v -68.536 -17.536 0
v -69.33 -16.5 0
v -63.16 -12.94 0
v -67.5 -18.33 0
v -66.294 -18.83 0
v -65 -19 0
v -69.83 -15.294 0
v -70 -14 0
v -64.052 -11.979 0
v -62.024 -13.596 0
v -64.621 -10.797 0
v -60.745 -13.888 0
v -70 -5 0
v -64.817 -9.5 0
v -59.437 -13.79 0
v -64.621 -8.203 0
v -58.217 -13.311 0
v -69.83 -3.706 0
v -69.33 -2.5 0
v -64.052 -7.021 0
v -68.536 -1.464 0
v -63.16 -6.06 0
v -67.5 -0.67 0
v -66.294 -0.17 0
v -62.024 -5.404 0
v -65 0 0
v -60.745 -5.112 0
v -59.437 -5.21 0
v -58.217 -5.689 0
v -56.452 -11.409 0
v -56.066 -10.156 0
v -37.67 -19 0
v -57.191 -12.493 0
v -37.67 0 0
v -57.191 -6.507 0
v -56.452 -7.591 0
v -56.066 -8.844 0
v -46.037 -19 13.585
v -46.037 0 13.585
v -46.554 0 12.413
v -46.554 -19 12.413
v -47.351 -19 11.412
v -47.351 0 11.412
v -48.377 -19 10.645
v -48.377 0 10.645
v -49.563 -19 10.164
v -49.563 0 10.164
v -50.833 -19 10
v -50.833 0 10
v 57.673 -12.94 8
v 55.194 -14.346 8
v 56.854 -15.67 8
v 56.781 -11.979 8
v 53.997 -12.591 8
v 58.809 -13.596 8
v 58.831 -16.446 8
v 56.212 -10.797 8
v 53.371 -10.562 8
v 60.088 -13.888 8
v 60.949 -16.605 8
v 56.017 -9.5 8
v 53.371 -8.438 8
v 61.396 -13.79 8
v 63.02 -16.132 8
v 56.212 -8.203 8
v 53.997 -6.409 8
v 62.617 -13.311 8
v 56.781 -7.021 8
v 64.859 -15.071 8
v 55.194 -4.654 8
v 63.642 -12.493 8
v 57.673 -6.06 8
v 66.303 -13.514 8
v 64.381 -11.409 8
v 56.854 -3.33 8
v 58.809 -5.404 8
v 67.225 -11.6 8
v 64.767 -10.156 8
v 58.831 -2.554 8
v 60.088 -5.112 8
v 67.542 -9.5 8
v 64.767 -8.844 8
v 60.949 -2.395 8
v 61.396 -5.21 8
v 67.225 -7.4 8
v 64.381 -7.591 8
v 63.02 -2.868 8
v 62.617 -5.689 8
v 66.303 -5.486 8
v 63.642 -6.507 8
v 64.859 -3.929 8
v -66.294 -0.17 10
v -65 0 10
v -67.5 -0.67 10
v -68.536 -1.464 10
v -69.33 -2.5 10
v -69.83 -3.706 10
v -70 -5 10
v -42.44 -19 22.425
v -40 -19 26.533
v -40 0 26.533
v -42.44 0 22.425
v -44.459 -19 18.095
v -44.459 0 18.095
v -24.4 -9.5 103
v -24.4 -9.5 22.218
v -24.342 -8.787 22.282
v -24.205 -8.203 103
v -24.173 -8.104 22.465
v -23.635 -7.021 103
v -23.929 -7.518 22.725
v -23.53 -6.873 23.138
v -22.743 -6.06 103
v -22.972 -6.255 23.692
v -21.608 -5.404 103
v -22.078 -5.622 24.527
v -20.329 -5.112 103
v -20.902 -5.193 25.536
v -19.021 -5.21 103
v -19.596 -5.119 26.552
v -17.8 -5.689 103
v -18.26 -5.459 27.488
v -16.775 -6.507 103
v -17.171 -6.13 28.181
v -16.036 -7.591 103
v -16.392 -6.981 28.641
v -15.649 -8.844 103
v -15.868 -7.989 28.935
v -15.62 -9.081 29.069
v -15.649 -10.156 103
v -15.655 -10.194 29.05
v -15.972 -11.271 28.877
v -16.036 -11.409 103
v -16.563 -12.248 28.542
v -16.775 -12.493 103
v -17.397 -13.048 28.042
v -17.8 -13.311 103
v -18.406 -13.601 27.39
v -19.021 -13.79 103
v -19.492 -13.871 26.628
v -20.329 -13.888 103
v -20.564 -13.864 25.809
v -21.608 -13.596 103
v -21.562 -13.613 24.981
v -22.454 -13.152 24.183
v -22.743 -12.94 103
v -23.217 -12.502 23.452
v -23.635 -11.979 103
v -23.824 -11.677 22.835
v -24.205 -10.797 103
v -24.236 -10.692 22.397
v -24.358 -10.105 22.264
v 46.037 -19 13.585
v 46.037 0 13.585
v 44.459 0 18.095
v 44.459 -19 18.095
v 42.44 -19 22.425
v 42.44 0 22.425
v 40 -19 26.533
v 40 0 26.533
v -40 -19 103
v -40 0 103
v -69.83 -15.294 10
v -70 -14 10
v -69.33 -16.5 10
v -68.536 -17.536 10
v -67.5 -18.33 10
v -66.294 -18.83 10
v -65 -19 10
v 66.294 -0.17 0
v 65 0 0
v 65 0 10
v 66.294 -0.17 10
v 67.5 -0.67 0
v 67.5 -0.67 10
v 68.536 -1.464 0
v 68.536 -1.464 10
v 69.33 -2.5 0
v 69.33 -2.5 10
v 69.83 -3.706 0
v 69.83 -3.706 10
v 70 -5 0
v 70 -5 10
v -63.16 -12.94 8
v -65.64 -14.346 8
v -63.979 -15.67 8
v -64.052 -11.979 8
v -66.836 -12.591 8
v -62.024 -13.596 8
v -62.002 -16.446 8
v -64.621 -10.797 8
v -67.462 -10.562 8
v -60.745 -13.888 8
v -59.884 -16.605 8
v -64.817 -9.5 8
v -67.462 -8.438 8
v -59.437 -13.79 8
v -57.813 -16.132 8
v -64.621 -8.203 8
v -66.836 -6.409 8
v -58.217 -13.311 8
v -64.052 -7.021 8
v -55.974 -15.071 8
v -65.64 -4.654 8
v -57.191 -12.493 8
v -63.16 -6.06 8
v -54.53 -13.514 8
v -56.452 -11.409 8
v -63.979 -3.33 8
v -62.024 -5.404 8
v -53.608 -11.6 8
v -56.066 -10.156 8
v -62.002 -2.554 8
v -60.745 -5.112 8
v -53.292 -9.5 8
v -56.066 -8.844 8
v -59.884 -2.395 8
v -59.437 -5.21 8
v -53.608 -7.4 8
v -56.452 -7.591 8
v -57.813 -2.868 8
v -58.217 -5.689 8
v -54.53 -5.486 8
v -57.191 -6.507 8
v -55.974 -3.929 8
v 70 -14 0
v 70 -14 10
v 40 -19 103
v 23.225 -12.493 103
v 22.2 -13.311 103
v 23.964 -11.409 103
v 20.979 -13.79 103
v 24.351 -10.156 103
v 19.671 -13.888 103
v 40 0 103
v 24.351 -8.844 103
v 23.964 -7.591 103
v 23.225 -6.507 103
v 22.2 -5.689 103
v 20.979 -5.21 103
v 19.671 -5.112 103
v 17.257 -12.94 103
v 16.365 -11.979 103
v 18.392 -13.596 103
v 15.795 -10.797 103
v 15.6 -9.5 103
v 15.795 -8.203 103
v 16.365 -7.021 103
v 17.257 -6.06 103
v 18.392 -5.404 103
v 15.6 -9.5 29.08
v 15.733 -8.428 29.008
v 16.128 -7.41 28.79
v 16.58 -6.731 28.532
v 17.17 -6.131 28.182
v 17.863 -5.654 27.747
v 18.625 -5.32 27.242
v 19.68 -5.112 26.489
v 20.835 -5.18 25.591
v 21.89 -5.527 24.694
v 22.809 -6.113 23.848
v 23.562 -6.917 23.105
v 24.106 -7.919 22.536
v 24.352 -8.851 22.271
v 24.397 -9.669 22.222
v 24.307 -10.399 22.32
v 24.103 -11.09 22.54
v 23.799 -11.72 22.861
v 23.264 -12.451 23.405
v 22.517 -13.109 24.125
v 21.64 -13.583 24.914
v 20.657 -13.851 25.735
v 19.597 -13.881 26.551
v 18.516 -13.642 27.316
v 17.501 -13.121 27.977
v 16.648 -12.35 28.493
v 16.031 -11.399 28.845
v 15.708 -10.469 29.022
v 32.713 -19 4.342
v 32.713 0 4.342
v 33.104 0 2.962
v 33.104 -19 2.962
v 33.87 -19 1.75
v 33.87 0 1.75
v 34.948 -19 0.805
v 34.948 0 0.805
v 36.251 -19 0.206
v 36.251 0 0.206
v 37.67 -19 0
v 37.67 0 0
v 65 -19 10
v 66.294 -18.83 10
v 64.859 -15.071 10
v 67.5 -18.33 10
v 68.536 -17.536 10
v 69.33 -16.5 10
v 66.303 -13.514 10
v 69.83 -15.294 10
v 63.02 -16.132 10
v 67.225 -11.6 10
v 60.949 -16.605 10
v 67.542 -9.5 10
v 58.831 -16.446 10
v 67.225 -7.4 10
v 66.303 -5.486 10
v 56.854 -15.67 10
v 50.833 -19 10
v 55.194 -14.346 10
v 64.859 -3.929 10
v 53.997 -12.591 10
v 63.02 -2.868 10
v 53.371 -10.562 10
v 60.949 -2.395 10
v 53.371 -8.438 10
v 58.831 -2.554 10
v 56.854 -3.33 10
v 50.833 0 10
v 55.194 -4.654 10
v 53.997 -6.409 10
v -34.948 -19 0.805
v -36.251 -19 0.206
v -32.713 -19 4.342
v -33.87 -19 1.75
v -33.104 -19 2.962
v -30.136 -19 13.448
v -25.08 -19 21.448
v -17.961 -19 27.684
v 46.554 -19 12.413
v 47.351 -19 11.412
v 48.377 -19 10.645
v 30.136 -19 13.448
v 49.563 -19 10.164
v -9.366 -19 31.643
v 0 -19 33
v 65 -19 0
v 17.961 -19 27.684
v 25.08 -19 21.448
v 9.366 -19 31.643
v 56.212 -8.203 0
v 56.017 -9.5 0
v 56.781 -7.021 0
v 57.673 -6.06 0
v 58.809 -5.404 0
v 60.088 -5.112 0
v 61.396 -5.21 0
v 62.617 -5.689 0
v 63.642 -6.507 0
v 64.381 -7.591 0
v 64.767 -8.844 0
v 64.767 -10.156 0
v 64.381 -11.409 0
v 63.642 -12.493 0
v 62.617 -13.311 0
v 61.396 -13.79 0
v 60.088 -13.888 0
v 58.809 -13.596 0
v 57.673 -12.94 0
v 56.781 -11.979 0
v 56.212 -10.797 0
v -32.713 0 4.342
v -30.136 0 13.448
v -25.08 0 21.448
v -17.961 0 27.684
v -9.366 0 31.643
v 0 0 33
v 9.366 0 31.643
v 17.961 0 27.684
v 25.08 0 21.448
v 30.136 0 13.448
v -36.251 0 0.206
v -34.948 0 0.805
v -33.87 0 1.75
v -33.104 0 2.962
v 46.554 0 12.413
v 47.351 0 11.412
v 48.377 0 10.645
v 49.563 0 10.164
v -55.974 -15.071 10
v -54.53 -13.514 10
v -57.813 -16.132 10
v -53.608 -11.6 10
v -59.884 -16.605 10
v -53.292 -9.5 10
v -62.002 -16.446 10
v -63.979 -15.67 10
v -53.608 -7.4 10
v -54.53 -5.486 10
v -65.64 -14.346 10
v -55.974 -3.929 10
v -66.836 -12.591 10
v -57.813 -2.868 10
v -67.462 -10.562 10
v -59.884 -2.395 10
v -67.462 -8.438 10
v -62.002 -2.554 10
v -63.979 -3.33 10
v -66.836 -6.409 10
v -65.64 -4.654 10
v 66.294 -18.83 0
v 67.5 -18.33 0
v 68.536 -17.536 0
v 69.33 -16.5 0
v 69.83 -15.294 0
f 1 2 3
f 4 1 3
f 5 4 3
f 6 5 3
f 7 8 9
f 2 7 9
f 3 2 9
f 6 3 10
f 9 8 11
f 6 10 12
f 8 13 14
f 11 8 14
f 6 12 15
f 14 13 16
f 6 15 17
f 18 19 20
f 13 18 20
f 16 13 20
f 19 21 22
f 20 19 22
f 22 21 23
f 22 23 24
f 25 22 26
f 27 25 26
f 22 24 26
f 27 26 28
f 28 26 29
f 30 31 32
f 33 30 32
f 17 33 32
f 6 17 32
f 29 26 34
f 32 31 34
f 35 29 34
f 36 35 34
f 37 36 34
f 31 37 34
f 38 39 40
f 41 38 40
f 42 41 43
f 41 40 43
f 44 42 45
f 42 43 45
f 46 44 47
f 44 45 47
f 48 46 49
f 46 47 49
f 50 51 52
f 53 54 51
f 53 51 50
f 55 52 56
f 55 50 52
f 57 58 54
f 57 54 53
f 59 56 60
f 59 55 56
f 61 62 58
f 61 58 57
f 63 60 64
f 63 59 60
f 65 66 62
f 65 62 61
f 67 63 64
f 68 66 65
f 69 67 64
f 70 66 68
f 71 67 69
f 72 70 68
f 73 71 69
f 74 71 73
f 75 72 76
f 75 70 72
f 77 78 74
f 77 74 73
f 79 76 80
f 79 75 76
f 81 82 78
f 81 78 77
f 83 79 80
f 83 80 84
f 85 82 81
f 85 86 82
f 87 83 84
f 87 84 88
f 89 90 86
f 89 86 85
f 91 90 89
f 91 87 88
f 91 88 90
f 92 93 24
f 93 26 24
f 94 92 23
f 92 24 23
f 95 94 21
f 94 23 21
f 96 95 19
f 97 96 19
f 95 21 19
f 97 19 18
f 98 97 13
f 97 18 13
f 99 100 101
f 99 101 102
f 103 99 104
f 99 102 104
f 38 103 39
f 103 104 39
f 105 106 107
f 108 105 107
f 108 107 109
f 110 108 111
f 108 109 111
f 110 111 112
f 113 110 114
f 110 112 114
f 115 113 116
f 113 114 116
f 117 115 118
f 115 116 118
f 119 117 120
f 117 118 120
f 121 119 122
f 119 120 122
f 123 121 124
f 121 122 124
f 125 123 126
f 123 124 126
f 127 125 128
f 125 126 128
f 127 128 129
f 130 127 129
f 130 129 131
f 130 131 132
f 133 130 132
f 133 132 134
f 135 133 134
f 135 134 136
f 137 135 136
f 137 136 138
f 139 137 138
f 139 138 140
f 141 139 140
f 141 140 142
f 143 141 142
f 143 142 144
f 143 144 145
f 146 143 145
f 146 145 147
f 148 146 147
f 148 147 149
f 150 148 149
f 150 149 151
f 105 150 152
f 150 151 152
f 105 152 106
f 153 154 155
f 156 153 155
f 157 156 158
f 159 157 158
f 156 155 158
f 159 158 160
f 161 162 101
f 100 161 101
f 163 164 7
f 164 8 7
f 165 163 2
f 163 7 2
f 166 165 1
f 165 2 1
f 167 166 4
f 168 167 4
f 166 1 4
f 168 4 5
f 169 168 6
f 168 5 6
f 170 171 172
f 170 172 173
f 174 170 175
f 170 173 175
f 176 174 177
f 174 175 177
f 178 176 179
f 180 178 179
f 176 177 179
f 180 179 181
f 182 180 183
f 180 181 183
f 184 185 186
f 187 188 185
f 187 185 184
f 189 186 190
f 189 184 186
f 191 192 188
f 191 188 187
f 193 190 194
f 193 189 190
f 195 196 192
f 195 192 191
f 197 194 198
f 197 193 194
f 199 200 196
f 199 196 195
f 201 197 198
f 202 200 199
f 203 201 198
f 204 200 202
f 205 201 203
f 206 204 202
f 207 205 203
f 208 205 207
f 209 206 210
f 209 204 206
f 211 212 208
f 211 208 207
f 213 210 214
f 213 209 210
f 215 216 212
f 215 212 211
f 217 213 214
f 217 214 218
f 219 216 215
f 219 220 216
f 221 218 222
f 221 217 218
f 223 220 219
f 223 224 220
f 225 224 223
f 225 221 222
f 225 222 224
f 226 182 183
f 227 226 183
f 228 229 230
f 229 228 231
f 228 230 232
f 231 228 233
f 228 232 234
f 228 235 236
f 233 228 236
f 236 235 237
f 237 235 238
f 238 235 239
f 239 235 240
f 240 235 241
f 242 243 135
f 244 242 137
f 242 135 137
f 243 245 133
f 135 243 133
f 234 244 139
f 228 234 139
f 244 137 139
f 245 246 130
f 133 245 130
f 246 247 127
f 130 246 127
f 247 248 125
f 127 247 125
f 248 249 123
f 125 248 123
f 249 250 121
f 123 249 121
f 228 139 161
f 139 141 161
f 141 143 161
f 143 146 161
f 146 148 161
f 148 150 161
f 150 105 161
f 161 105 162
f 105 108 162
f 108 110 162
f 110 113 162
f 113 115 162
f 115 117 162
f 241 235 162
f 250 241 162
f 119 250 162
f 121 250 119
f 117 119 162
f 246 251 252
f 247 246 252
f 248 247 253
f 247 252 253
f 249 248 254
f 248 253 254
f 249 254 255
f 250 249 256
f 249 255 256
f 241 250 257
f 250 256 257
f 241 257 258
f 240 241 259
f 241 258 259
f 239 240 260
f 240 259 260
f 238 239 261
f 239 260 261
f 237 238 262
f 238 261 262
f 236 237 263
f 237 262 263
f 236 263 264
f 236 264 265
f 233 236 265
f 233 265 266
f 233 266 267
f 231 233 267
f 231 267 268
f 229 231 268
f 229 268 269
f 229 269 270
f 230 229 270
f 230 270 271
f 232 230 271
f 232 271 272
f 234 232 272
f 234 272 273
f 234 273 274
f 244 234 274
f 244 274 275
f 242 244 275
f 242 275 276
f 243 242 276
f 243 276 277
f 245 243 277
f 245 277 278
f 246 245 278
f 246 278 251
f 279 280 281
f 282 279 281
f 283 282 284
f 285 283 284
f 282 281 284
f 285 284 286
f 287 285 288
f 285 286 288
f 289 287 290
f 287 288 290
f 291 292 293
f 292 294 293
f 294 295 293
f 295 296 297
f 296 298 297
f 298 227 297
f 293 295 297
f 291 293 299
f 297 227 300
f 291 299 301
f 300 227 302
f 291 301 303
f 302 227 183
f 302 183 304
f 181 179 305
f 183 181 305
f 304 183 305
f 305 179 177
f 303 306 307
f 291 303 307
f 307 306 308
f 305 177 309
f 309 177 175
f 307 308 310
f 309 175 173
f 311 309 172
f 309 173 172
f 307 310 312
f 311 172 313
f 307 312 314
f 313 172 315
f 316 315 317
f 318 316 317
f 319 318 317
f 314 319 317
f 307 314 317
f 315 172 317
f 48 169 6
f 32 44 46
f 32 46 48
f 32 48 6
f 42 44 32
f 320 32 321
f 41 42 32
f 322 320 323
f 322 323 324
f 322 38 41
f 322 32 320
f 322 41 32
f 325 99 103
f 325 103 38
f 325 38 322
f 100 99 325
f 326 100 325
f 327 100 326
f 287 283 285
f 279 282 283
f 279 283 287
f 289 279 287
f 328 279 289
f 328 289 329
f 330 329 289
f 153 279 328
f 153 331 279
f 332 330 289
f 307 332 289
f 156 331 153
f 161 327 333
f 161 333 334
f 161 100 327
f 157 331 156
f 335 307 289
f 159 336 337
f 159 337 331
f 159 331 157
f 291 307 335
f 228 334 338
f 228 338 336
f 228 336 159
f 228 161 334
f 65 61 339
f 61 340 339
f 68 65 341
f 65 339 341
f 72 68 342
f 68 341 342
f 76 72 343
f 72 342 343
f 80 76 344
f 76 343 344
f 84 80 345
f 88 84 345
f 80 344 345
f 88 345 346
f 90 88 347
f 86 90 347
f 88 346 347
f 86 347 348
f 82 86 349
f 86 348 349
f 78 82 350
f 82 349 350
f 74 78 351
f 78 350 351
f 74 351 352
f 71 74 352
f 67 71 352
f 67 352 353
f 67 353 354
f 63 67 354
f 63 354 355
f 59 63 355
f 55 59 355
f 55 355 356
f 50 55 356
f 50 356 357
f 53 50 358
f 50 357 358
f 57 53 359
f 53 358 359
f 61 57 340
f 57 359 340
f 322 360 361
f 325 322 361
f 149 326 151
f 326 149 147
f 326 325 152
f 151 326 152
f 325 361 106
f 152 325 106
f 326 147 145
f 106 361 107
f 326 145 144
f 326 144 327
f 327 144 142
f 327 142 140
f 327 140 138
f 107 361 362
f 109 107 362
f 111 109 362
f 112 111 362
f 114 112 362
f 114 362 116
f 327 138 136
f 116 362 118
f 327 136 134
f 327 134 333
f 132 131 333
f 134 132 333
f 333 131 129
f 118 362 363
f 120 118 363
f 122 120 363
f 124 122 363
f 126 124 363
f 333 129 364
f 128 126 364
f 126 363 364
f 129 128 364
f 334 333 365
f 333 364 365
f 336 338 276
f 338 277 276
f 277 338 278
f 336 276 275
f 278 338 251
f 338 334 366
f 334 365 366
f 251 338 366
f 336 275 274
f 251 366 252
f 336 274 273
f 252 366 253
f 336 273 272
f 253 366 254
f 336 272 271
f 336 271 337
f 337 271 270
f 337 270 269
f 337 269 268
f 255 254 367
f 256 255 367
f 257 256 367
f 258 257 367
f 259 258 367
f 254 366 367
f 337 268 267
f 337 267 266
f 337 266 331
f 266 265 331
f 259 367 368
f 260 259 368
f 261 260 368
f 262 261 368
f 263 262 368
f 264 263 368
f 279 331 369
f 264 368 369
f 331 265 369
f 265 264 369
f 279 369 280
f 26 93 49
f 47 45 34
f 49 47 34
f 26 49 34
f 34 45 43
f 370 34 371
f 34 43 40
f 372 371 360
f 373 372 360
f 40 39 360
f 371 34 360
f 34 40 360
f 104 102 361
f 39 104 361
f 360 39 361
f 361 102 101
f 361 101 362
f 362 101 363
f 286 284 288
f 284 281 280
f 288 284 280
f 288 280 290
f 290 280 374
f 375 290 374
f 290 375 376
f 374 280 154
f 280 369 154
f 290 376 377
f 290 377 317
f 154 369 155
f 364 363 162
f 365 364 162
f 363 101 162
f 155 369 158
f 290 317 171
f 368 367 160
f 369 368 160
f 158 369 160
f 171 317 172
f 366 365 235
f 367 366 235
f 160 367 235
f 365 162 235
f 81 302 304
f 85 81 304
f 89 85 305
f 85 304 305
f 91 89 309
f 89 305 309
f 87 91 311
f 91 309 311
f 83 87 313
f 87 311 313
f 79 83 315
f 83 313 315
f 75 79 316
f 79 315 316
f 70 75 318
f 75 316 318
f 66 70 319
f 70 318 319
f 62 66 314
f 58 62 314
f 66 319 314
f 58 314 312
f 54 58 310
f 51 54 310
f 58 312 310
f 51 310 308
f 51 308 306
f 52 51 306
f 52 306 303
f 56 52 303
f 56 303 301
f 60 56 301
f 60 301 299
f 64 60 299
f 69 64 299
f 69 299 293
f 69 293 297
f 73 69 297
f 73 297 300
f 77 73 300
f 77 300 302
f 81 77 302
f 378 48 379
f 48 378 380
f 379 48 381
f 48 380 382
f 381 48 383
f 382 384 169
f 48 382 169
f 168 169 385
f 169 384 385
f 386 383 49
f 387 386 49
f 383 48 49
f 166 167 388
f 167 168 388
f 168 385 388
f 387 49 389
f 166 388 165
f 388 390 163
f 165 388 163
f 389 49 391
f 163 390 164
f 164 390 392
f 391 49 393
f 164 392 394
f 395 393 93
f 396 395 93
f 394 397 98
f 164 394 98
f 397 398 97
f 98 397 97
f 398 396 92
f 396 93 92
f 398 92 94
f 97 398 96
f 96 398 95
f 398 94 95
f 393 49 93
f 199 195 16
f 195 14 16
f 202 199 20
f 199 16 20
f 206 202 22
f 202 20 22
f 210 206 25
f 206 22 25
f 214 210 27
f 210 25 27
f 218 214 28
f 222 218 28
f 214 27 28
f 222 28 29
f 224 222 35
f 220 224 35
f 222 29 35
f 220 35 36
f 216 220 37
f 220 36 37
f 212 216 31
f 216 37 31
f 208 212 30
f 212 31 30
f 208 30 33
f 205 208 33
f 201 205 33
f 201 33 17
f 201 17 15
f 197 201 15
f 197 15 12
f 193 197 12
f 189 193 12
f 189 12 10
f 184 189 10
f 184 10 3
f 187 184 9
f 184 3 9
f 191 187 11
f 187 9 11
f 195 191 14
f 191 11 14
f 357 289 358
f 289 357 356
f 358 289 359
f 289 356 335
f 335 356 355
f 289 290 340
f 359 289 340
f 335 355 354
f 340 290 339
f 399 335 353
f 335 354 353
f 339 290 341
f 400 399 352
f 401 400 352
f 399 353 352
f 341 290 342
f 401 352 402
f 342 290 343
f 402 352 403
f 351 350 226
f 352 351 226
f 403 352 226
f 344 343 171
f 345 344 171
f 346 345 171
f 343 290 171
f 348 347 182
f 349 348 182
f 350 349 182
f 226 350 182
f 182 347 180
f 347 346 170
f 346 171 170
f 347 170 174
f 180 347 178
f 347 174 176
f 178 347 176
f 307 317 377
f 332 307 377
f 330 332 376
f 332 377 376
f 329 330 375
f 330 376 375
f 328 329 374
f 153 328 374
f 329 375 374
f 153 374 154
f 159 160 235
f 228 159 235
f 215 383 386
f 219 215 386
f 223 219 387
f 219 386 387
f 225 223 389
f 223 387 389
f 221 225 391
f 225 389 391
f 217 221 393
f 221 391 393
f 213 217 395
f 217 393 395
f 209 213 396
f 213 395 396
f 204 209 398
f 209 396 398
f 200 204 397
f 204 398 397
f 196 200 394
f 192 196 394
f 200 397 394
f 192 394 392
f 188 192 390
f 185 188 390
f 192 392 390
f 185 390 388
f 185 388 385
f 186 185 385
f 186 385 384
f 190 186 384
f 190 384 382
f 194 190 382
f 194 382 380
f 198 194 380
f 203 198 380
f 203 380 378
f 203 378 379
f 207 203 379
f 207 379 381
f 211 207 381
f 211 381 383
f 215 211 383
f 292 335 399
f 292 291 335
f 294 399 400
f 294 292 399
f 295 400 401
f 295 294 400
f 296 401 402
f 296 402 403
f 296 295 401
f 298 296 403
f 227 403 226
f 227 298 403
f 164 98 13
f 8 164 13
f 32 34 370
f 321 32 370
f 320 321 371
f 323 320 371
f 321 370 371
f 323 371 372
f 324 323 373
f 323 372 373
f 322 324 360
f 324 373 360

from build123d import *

# Parameters (mm, degrees)
F1_DEPTH       = 19
F3_D           = 8.8
F3_CBORE_D     = 14.25
F3_CBORE_DEPTH = 2
F4_R           = 5
F6_D           = 8.8
F6_CBORE_D     = 14.25
F6_CBORE_DEPTH = 2
F7_R           = 5
F9_D           = 8.8


with BuildPart() as f1:
    # F0 (on Front) → F1 (new body)
    with BuildSketch(Plane.XZ):
        with BuildLine():
            ThreePointArc((-32.7130879295, 4.3421052632), (0, 33), (32.7130879295, 4.3421052632))
            ThreePointArc((32.7130879295, 4.3421052632), (34.3748837654, 1.2390510716), (37.6696164037, 0))
            Line((37.6696164037, 0), (70, 0))
            Line((70, 0), (70, 10))
            Line((70, 10), (50.8330601086, 10))
            ThreePointArc((50.8330601086, 10), (47.8393560232, 10.9952857968), (46.0374884002, 13.5849056604))
            ThreePointArc((46.0374884002, 13.5849056604), (43.5031680278, 20.2848310702), (40, 26.5329983228))
            Line((40, 26.5329983228), (40, 103))
            Line((40, 103), (0, 103))
            Line((0, 103), (-40, 103))
            Line((-40, 103), (-40, 26.5329983228))
            ThreePointArc((-40, 26.5329983228), (-43.5031680278, 20.2848310702), (-46.0374884002, 13.5849056604))
            ThreePointArc((-46.0374884002, 13.5849056604), (-47.8393560232, 10.9952857968), (-50.8330601086, 10))
            Line((-50.8330601086, 10), (-70, 10))
            Line((-70, 10), (-70, 0))
            Line((-70, 0), (-37.6696164037, 0))
            ThreePointArc((-37.6696164037, 0), (-34.3748837654, 1.2390510716), (-32.7130879295, 4.3421052632))
        make_face()
    extrude(amount=F1_DEPTH)

    # F3 (through all)
    with Locations(Plane.XY.offset(10)):
        with Locations((60.4165300543, -9.5)):
            CounterBoreHole(F3_D / 2, F3_CBORE_D / 2, F3_CBORE_DEPTH)

    # F4
    f4_edges = [f1.edges().sort_by_distance(p)[0] for p in [
        (70, -19, 5),
        (70, 0, 5),
    ]]
    fillet(f4_edges, radius=F4_R)

    # F6 (through all)
    with Locations(Plane.XY.offset(10)):
        with Locations((-60.4165300543, -9.5)):
            CounterBoreHole(F6_D / 2, F6_CBORE_D / 2, F6_CBORE_DEPTH)

    # F7
    f7_edges = [f1.edges().sort_by_distance(p)[0] for p in [
        (-70, -19, 5),
        (-70, 0, 5),
    ]]
    fillet(f7_edges, radius=F7_R)

    # F9 (through all)
    with Locations(Plane.XY.offset(103)):
        with Locations((20, -9.5), (-20, -9.5)):
            Hole(F9_D / 2)


solid = f1.part
